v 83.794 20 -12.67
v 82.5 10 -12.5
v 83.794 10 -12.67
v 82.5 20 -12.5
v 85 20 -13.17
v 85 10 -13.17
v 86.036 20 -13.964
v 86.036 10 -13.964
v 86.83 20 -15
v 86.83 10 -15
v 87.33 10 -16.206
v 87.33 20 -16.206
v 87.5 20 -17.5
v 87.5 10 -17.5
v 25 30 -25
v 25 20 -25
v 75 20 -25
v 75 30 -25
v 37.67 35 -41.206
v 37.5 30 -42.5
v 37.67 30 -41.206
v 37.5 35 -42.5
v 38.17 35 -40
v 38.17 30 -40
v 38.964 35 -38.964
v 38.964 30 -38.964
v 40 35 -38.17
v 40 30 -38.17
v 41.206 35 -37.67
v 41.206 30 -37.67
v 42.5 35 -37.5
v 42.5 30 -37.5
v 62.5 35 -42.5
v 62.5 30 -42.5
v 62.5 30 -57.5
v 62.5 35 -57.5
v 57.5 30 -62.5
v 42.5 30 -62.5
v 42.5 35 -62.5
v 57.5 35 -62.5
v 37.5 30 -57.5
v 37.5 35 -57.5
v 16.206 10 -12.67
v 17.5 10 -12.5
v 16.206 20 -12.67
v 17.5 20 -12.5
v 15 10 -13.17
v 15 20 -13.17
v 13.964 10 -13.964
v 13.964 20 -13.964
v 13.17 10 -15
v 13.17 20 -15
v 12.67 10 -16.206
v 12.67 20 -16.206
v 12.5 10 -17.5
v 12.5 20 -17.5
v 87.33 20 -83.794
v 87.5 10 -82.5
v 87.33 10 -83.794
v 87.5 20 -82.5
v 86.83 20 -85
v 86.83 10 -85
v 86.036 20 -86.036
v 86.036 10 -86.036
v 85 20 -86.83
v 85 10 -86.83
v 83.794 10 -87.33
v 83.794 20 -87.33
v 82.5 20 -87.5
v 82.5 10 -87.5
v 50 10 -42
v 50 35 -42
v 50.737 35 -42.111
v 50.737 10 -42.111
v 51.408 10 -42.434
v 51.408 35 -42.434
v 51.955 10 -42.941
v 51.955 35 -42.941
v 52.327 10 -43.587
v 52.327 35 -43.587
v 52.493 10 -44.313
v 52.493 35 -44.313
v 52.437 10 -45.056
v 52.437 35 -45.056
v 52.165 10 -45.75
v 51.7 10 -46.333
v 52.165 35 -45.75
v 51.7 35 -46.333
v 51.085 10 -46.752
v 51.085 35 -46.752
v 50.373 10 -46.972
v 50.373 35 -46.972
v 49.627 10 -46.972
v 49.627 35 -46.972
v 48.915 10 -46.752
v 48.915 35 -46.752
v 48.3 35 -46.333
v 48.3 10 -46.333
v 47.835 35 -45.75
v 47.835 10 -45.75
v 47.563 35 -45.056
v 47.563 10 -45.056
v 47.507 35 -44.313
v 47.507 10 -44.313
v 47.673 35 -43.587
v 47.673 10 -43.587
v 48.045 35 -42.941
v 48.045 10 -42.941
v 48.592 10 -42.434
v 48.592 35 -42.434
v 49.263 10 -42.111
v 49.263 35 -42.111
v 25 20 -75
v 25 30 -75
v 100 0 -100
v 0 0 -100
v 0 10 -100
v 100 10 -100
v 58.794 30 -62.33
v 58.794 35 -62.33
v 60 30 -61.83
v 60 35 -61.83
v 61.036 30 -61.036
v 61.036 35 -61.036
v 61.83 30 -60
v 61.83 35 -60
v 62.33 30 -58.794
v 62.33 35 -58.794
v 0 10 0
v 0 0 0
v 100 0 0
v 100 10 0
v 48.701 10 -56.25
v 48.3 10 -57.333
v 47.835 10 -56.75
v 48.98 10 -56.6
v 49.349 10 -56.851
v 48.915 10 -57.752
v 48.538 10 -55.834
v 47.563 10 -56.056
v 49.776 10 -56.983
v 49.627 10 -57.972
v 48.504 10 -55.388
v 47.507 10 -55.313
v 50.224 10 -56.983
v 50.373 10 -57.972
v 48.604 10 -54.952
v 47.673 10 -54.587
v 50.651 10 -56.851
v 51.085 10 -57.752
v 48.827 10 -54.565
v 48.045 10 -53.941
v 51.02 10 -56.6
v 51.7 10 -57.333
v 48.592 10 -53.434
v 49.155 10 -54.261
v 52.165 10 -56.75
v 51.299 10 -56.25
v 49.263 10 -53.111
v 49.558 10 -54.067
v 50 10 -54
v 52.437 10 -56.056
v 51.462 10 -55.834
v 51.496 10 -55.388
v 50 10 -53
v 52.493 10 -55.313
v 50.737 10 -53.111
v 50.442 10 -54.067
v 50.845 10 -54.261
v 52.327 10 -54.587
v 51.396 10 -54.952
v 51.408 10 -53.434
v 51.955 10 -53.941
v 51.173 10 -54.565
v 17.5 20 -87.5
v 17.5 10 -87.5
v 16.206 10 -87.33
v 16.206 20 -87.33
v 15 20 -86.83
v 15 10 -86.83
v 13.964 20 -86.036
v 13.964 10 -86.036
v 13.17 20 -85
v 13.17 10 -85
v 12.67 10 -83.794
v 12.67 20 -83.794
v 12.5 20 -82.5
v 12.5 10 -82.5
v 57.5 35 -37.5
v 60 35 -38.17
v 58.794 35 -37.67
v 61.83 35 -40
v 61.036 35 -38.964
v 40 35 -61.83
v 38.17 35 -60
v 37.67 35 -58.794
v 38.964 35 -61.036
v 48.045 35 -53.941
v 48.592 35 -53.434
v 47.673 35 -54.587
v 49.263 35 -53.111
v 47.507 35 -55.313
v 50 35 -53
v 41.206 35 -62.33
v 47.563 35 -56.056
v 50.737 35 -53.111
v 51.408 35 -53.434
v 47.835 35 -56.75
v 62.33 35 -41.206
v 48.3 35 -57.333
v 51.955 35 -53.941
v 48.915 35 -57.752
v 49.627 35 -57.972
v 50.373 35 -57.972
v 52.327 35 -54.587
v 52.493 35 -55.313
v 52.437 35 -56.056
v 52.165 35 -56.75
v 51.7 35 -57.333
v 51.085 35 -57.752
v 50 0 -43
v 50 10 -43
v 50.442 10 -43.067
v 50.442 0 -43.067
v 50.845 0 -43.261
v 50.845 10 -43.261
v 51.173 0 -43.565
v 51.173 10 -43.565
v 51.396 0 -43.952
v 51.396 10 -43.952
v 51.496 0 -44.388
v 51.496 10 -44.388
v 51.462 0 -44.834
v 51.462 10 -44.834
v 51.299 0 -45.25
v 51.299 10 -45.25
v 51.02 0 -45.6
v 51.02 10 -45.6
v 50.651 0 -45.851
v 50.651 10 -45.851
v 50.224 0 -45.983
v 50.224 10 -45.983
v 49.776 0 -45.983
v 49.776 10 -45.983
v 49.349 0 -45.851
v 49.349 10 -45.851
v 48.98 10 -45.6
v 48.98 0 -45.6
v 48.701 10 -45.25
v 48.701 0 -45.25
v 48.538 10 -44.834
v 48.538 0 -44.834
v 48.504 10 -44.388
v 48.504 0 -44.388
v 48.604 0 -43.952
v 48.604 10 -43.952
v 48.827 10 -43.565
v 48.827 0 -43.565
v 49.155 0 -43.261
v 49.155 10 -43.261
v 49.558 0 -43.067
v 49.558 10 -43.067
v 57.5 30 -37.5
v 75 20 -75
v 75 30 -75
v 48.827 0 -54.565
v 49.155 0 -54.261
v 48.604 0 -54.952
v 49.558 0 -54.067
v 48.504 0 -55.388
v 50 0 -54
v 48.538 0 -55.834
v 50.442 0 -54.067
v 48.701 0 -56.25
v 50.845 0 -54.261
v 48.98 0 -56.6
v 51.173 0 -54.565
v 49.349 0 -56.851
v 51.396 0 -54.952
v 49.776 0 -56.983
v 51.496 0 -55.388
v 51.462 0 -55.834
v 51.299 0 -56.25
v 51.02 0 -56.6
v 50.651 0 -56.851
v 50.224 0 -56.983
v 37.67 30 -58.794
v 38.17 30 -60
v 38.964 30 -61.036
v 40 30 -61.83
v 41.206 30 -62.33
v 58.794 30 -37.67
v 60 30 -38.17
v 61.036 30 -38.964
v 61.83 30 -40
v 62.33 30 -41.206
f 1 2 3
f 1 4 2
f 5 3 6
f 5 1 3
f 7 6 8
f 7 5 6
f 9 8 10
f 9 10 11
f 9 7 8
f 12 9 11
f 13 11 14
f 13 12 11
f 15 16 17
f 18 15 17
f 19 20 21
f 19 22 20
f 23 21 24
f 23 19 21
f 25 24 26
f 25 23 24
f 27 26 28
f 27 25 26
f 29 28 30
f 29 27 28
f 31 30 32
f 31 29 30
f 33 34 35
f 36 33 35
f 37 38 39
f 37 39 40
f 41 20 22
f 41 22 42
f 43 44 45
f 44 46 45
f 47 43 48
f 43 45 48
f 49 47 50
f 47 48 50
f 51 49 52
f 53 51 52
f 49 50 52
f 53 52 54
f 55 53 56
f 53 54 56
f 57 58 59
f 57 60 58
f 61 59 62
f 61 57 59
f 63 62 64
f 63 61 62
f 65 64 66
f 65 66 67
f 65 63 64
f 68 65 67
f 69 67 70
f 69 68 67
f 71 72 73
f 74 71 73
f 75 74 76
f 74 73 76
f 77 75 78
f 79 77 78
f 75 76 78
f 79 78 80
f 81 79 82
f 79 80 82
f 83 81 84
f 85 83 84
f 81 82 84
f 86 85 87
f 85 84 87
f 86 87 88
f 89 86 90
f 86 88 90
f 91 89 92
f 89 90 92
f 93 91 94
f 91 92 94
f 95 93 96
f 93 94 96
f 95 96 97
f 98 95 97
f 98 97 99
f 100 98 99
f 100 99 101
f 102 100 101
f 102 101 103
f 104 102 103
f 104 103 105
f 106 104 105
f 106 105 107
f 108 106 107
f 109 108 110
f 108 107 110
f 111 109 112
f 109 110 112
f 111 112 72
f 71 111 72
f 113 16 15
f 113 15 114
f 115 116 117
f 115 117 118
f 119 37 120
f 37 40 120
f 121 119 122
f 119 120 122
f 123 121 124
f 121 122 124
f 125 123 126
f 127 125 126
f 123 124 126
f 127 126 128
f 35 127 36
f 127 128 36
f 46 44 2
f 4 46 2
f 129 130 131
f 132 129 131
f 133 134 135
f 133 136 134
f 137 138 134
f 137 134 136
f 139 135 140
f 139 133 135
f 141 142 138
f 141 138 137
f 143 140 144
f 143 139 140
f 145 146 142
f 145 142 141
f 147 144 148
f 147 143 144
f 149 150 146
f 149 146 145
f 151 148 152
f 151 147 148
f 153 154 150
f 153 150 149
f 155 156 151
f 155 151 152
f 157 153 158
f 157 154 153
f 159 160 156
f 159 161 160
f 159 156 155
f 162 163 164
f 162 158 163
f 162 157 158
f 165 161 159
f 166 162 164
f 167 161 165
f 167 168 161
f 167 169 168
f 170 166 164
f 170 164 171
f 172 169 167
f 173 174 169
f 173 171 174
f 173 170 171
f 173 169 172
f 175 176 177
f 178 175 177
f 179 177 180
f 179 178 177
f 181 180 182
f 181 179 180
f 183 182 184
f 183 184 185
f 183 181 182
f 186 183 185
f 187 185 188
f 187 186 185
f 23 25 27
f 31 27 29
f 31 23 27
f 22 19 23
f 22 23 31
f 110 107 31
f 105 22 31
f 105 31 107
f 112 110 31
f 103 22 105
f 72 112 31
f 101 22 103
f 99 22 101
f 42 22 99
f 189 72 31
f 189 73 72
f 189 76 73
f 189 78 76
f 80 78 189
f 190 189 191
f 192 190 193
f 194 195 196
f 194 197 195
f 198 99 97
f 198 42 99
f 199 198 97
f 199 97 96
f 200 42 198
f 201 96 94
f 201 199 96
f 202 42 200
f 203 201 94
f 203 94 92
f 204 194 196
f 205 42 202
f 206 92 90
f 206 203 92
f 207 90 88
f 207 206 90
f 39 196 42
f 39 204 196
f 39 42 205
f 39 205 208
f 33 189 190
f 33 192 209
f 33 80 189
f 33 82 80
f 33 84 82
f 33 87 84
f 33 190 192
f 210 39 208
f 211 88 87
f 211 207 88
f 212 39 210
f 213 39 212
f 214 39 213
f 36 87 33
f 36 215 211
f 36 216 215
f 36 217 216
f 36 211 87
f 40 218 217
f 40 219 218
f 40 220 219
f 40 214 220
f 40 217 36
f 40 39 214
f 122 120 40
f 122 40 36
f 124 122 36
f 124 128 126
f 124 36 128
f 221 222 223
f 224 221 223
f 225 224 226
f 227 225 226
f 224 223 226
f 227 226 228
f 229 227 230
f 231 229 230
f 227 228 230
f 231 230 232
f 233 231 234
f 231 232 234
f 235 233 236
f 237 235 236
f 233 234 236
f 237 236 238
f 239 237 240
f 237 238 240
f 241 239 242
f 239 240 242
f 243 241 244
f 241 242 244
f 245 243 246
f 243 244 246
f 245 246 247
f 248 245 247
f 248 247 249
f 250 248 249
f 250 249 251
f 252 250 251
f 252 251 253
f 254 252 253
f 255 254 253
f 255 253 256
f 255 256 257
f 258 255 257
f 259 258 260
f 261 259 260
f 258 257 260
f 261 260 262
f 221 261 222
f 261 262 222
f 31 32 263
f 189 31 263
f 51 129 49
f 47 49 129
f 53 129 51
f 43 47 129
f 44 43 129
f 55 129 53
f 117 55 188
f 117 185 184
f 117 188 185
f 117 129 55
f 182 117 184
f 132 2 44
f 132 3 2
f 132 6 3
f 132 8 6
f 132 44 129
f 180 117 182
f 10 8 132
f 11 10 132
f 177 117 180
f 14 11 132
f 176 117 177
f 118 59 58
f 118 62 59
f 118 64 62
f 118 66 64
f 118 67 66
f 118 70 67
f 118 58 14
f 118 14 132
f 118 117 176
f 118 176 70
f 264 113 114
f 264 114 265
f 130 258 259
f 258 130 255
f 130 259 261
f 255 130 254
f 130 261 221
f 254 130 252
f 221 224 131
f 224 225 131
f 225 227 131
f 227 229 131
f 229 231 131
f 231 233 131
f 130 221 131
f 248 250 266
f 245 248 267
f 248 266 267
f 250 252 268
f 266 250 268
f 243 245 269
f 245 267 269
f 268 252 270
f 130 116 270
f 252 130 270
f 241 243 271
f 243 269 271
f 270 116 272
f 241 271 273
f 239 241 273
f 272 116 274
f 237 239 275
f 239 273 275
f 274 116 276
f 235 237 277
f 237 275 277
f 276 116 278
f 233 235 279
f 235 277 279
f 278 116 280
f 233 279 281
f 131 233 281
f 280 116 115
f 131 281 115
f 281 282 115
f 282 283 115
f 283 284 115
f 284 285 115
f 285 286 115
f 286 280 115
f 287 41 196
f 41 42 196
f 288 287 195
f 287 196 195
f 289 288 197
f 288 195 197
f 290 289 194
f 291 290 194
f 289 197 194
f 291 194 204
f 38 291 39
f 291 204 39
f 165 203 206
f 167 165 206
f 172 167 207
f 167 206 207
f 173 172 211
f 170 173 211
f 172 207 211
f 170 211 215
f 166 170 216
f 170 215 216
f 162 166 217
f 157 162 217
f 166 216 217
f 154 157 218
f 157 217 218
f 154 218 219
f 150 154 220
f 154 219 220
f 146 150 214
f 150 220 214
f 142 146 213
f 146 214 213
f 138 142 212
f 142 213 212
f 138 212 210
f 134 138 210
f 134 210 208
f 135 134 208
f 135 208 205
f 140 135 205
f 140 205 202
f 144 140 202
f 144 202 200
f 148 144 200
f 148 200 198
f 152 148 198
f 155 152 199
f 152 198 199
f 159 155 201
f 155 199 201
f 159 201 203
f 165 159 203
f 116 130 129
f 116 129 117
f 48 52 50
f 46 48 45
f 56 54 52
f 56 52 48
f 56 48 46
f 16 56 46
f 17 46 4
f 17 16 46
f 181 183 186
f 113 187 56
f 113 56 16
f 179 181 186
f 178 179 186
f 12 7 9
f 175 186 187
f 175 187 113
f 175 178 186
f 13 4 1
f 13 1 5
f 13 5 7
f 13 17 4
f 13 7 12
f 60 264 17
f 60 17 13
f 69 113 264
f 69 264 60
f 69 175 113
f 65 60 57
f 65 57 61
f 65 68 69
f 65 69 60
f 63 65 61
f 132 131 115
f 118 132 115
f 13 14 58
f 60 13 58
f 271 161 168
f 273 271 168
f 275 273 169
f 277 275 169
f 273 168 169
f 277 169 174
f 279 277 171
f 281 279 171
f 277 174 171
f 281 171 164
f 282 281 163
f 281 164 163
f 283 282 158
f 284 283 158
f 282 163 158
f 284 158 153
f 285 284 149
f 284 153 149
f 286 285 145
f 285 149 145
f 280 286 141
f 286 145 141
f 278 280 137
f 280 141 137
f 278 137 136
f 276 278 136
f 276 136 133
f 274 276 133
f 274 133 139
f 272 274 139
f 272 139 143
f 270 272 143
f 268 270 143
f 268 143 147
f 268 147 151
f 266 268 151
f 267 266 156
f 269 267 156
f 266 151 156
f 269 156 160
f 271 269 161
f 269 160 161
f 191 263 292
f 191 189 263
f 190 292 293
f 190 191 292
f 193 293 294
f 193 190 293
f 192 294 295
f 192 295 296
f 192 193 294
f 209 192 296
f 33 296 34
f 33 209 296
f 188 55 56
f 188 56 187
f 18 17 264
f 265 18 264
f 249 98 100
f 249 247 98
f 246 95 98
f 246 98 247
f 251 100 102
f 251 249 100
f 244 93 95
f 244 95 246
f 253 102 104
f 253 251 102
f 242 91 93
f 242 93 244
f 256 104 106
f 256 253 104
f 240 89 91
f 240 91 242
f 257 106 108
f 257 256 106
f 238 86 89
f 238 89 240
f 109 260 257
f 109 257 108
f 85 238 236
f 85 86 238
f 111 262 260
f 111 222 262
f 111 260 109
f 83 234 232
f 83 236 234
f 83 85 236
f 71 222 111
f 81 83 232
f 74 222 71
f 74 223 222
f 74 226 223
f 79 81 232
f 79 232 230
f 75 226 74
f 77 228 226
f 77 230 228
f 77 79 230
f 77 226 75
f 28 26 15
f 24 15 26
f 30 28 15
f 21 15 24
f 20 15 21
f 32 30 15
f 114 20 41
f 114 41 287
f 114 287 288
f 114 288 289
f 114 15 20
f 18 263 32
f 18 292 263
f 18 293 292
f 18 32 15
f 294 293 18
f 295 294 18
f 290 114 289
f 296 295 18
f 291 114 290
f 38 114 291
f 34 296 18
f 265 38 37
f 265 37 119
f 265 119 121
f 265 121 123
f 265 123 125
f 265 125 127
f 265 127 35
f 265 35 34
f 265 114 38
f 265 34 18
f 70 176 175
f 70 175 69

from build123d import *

# Parameters (mm, degrees)
SKETCH1_W           = 100
SKETCH1_H           = 100
BOSS_EXTRUDE1_DEPTH = 10
SKETCH2_W           = 75
SKETCH2_H           = 75
BOSS_EXTRUDE2_DEPTH = 10
SKETCH3_W           = 50
SKETCH3_H           = 50
BOSS_EXTRUDE3_DEPTH = 10
SKETCH4_W           = 25
SKETCH4_H           = 25
BOSS_EXTRUDE4_DEPTH = 5
SKETCH5_R           = 2.5
CUT_EXTRUDE1_DEPTH  = 25
SKETCH6_R           = 1.5
CUT_EXTRUDE2_DEPTH  = 10
FILLET2_R           = 5


with BuildPart() as part:
    # Sketch1 → Boss-Extrude1 (new body)
    with BuildSketch(Plane(origin=(0, 0, 0), x_dir=(1, 0, 0), z_dir=(0, 1, 0))):
        with Locations((50, 50)):
            Rectangle(SKETCH1_W, SKETCH1_H)
    extrude(amount=BOSS_EXTRUDE1_DEPTH)

    # Sketch2 → Boss-Extrude2 (add)
    with BuildSketch(Plane(origin=(0, 10, 0), x_dir=(1, 0, 0), z_dir=(0, 1, 0))):
        with Locations((50, 50)):
            Rectangle(SKETCH2_W, SKETCH2_H)
    extrude(amount=BOSS_EXTRUDE2_DEPTH)

    # Sketch3 → Boss-Extrude3 (add)
    with BuildSketch(Plane(origin=(0, 20, 0), x_dir=(1, 0, 0), z_dir=(0, 1, 0))):
        with Locations((50, 50)):
            Rectangle(SKETCH3_W, SKETCH3_H)
    extrude(amount=BOSS_EXTRUDE3_DEPTH)

    # Sketch4 → Boss-Extrude4 (add)
    with BuildSketch(Plane(origin=(0, 30, 0), x_dir=(1, 0, 0), z_dir=(0, 1, 0))):
        with Locations((50, 50)):
            Rectangle(SKETCH4_W, SKETCH4_H)
    extrude(amount=BOSS_EXTRUDE4_DEPTH)

    # Sketch5 → Cut-Extrude1 (cut)
    with BuildSketch(Plane(origin=(0, 35, 0), x_dir=(1, 0, 0), z_dir=(0, 1, 0))):
        with Locations(Location((50, 55.5, 0), (0, 0, 270))):
            Circle(SKETCH5_R)
        with Locations(Location((50, 44.5, 0), (0, 0, 270))):
            Circle(SKETCH5_R)
    extrude(amount=-CUT_EXTRUDE1_DEPTH, mode=Mode.SUBTRACT)

    # Sketch6 → Cut-Extrude2 (cut)
    with BuildSketch(Plane(origin=(0, 10, 0), x_dir=(1, 0, 0), z_dir=(0, 1, 0))):
        with Locations(Location((50, 55.5, 0), (0, 0, 270))):
            Circle(SKETCH6_R)
        with Locations(Location((50, 44.5, 0), (0, 0, 270))):
            Circle(SKETCH6_R)
    extrude(amount=-CUT_EXTRUDE2_DEPTH, mode=Mode.SUBTRACT)

    # Fillet2
    fillet2_edges = [part.edges().sort_by_distance(p)[0] for p in [
        (12.5, 15, -87.5),
        (12.5, 15, -12.5),
        (87.5, 15, -12.5),
        (87.5, 15, -87.5),
        (37.5, 32.5, -62.5),
        (37.5, 32.5, -37.5),
        (62.5, 32.5, -37.5),
        (62.5, 32.5, -62.5),
    ]]
    fillet(fillet2_edges, radius=FILLET2_R)


solid = part.part
